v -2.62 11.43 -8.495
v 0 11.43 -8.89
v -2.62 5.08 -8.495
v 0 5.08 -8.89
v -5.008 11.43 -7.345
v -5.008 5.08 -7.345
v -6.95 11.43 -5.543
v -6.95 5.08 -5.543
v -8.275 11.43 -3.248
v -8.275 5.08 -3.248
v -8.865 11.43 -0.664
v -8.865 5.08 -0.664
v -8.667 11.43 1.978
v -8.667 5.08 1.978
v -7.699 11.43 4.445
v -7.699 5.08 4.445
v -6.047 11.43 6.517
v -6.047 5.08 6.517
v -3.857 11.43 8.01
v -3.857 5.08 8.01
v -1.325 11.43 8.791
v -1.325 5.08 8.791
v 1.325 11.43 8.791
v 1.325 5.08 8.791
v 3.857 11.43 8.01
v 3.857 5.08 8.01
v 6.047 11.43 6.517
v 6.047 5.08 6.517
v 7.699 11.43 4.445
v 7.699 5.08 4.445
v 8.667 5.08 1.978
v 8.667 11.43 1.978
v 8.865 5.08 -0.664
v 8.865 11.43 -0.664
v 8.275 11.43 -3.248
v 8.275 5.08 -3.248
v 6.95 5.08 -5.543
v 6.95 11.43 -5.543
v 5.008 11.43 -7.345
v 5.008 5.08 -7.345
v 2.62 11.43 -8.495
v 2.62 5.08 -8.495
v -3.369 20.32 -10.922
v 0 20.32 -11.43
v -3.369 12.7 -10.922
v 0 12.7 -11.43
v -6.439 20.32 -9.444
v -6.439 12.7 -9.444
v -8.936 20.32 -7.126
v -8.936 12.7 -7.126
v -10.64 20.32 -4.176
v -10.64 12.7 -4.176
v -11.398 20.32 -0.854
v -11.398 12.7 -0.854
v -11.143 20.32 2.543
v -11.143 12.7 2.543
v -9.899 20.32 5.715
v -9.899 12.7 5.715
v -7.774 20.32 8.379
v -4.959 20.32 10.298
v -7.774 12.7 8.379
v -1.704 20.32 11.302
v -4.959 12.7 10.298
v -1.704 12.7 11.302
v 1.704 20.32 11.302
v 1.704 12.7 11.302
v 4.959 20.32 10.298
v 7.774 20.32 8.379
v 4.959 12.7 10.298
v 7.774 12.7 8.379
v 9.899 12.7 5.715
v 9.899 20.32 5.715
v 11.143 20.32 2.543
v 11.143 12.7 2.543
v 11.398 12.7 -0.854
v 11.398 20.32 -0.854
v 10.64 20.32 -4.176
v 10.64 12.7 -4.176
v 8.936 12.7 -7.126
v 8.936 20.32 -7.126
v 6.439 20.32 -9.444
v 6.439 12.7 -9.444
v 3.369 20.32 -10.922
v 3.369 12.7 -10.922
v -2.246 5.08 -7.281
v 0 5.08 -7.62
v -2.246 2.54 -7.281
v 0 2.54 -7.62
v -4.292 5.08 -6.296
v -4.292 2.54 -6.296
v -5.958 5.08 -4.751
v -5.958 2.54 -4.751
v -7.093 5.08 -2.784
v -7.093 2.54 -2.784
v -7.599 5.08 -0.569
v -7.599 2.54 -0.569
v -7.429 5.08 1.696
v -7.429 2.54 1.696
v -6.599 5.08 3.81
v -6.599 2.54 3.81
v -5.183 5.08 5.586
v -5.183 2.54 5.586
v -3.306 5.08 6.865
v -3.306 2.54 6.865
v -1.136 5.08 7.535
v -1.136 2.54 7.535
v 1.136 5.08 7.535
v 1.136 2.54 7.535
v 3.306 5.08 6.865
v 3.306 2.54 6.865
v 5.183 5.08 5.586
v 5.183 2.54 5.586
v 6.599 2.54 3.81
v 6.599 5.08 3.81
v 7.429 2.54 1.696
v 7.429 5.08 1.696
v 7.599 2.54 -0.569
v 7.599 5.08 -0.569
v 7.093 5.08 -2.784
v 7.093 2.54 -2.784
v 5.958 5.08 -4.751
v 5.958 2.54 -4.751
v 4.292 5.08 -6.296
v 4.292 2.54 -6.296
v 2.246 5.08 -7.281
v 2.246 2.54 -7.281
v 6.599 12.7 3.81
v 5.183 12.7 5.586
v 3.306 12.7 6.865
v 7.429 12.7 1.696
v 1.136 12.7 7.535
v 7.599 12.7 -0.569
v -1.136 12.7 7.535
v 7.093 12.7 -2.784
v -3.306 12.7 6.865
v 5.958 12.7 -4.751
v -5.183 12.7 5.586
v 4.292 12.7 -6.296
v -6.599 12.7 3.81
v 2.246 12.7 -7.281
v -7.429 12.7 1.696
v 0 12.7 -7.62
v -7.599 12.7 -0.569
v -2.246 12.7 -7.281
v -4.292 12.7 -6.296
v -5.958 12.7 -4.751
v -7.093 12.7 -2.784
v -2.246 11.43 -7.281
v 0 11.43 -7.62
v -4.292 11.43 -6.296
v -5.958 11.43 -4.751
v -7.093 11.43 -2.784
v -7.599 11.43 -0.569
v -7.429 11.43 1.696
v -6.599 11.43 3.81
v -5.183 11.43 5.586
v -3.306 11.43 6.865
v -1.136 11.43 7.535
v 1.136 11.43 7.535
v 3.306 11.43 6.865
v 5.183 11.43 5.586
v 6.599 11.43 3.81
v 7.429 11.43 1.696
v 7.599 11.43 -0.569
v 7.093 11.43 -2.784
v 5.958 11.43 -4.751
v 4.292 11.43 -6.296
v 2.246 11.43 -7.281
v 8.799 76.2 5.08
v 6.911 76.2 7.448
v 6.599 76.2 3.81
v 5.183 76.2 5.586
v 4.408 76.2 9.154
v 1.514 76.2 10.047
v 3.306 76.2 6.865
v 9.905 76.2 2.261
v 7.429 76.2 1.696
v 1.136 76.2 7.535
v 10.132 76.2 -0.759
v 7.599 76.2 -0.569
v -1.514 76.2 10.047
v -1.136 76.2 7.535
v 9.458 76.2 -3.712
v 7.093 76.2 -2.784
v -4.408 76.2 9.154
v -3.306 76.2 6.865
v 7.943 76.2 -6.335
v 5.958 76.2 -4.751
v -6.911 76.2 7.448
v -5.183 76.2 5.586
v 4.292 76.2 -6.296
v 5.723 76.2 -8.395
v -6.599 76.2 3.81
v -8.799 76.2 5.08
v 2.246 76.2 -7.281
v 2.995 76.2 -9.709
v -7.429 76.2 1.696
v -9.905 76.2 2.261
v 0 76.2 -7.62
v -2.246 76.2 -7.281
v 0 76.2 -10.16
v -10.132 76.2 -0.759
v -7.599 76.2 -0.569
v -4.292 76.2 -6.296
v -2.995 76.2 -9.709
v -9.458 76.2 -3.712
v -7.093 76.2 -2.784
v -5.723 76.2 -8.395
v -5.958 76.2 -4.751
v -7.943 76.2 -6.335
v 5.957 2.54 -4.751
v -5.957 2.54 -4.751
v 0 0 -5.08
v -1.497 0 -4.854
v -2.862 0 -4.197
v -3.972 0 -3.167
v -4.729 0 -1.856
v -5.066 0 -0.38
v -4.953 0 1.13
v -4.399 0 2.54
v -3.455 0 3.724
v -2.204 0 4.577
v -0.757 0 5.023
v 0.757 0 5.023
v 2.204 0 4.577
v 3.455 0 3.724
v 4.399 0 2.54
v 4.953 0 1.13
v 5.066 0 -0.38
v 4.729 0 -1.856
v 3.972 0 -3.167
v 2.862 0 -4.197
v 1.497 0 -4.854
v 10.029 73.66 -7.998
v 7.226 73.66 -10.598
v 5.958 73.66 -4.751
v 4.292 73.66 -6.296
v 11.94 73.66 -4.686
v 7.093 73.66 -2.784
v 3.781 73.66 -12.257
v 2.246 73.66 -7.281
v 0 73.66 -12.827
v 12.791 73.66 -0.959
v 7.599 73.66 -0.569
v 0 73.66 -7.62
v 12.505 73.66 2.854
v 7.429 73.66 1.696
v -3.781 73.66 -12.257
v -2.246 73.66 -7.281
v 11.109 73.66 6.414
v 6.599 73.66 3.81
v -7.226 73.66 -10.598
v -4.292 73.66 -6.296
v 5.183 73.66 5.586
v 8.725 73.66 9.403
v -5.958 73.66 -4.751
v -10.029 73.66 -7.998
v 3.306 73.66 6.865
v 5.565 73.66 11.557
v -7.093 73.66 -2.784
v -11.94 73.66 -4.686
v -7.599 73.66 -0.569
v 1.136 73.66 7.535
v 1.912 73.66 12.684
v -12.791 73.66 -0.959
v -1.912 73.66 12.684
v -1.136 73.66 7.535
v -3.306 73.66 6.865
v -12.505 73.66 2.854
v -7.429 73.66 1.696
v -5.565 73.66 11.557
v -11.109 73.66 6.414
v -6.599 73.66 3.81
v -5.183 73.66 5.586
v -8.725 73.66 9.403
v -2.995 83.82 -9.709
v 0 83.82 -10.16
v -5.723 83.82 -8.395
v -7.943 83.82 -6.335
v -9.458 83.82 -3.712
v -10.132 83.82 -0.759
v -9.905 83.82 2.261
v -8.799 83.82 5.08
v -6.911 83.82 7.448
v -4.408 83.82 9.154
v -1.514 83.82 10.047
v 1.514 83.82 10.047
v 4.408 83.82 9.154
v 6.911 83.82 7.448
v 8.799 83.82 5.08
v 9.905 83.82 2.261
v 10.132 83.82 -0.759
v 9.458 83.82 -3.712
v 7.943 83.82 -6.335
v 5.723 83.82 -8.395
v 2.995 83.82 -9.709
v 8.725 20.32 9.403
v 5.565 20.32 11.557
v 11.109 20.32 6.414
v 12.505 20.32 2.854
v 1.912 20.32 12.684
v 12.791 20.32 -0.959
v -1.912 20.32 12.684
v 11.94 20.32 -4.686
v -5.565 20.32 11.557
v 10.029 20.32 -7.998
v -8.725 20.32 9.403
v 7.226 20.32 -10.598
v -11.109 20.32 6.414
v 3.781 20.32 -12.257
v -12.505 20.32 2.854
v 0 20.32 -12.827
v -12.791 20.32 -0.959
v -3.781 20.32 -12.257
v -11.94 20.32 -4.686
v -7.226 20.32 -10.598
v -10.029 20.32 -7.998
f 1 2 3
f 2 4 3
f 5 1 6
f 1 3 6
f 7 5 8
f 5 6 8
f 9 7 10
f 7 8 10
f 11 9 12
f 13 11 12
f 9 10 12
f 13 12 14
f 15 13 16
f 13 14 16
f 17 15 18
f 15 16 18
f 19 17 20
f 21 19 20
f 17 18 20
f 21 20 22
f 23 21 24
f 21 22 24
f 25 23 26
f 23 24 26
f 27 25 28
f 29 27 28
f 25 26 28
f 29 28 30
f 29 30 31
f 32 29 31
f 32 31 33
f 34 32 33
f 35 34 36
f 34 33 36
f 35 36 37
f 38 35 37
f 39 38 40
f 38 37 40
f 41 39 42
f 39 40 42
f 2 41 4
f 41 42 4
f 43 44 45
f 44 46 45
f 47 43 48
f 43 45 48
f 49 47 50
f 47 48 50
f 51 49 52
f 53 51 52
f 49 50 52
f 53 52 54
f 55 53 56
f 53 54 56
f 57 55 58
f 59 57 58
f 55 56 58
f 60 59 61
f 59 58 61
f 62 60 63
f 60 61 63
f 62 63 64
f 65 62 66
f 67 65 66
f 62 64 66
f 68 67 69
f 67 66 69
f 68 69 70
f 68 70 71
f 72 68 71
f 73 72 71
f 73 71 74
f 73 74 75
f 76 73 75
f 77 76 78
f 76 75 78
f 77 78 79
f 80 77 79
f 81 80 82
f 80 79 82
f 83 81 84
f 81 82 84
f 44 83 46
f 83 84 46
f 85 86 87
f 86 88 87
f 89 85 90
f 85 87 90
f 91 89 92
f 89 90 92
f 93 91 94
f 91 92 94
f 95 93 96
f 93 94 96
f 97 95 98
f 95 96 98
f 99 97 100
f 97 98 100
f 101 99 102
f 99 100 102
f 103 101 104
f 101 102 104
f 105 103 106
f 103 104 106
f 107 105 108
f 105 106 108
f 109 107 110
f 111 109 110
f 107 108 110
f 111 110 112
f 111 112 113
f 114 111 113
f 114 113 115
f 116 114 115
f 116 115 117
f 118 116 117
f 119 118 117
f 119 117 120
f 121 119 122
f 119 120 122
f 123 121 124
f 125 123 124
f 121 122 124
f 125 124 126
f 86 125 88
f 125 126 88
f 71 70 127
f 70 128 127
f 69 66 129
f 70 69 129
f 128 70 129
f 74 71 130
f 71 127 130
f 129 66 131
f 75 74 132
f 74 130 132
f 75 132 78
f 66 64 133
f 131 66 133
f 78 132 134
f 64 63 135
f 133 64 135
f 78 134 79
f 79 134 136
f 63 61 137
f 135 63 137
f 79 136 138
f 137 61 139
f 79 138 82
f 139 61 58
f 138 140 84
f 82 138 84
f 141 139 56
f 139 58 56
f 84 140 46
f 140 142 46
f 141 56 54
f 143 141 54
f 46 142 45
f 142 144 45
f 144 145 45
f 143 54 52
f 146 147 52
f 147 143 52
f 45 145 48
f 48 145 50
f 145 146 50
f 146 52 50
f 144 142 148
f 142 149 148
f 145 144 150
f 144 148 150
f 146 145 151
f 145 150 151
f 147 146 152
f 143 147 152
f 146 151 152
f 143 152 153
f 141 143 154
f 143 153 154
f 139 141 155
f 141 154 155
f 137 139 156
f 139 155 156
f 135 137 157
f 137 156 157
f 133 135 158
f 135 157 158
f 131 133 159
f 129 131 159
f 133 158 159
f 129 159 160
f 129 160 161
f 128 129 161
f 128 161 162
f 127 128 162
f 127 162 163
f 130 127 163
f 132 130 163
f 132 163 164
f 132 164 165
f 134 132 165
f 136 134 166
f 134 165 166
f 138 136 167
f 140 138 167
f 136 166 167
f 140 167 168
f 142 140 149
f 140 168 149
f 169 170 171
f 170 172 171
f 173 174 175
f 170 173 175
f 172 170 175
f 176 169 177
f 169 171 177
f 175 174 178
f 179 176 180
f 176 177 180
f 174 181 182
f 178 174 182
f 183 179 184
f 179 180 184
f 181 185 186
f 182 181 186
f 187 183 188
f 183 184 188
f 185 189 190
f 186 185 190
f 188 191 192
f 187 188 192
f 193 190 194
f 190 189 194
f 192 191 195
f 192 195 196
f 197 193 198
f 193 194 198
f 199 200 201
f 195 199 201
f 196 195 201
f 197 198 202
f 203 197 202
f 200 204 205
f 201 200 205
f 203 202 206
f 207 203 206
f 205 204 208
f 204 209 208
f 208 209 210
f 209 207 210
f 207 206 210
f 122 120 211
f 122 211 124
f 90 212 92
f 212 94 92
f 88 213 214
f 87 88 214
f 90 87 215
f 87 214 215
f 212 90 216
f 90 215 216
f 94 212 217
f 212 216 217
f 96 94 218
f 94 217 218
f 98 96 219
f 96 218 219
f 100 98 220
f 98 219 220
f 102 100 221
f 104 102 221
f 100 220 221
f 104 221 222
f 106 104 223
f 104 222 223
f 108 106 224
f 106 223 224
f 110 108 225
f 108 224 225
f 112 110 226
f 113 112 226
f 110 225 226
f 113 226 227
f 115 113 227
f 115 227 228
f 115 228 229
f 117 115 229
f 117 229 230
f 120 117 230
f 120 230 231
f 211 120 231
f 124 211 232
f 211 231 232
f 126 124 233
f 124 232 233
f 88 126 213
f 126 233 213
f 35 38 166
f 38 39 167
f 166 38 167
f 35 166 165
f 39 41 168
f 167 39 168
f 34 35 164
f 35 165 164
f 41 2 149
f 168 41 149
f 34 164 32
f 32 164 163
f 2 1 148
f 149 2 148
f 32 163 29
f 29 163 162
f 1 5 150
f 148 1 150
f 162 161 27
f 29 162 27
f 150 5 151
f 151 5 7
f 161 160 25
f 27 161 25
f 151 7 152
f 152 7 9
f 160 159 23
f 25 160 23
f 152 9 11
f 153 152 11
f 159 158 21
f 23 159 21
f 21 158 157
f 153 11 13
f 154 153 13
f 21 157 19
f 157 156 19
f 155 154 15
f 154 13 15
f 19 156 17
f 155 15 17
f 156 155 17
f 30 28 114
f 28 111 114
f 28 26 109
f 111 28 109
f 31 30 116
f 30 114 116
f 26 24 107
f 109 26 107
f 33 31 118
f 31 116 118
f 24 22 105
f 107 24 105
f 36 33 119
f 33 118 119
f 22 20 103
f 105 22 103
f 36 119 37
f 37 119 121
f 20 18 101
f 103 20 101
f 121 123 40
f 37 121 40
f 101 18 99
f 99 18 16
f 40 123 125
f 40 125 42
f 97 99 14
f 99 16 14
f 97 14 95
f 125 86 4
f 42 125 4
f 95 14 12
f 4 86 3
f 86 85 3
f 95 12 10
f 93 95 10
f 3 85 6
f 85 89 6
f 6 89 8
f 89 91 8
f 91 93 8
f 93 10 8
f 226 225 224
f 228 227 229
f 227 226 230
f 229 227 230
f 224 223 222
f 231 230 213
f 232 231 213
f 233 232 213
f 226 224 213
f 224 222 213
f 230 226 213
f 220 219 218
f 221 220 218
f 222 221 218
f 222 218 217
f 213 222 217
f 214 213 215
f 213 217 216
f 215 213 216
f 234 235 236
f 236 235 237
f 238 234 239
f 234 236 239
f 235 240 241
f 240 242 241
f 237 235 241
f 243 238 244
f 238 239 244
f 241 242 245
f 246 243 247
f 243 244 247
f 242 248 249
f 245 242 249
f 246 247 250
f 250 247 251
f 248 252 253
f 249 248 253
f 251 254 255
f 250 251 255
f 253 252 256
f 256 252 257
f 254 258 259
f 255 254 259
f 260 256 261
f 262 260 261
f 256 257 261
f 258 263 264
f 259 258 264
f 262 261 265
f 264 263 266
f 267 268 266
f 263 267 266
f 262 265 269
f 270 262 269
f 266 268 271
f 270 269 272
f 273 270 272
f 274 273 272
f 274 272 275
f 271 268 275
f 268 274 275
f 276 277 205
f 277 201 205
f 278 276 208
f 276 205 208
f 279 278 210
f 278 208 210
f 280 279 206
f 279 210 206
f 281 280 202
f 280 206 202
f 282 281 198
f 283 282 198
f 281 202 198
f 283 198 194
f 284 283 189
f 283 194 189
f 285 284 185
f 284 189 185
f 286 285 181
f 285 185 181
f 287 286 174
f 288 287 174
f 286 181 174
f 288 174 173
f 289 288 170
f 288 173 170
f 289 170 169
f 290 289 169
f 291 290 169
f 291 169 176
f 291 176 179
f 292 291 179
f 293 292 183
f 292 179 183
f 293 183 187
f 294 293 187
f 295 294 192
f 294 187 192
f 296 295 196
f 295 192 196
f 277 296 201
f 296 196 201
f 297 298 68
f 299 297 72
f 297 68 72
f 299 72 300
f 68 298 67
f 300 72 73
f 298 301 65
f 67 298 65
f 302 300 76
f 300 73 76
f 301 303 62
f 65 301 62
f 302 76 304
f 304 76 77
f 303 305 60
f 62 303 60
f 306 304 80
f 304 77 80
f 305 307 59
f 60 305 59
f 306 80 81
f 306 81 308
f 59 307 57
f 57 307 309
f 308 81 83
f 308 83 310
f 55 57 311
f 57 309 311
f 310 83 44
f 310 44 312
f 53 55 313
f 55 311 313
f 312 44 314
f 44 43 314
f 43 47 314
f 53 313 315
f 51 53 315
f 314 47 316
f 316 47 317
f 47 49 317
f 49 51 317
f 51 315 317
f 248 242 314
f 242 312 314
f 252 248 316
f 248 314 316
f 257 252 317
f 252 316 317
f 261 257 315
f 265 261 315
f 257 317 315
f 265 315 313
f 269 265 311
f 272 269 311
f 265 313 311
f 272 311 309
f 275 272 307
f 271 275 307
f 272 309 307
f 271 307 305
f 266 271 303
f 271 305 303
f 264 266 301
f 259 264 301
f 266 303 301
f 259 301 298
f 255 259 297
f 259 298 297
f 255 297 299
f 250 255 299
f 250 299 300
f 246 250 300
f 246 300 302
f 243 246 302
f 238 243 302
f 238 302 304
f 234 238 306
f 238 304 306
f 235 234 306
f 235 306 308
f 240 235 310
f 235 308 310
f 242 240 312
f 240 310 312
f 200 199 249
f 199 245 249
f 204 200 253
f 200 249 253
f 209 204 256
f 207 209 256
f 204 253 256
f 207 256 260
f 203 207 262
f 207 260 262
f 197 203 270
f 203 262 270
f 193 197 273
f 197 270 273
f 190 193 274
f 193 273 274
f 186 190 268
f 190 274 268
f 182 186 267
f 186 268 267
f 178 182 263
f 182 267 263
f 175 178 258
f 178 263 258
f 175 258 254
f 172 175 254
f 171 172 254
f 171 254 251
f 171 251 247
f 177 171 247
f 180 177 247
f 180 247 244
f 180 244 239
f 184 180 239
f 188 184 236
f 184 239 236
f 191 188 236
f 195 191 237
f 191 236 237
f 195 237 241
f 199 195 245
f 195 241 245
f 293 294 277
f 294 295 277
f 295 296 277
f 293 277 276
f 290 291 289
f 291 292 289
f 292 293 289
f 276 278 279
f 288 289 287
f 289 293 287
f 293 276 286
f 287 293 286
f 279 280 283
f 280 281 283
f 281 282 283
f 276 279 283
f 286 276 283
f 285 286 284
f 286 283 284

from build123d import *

# Parameters (mm, degrees)
CHAMFER1_SIZE = 2.54


with BuildPart() as part:
    # Sketch1 → Revolve1 (revolve)
    with BuildSketch(Plane.XY, mode=Mode.PRIVATE) as revolve1_sk:
        Polygon((12.827, 73.66), (12.827, 20.32), (11.43, 20.32), (11.43, 12.7), (7.62, 12.7), (7.62, 11.43), (8.89, 11.43), (8.89, 5.08), (7.62, 5.08), (7.62, 2.54), (5.08, 2.54), (5.08, 0), (0, 0), (0, 83.82), (10.16, 83.82), (10.16, 76.2), (7.62, 76.2), (7.62, 73.66), align=None)
    revolve(revolve1_sk.sketch.rotate(Axis((0, 0, 0), (0, 1, 0)), 90), axis=Axis((0, 0, 0), (0, 1, 0)))

    # Chamfer1
    chamfer1_edges = [part.edges().sort_by_distance(p)[0] for p in [
        (0, 2.54, 5.08),
    ]]
    chamfer(chamfer1_edges, length=CHAMFER1_SIZE - 0.0001)  # a hair under: the kernel refuses the full size


solid = part.part
